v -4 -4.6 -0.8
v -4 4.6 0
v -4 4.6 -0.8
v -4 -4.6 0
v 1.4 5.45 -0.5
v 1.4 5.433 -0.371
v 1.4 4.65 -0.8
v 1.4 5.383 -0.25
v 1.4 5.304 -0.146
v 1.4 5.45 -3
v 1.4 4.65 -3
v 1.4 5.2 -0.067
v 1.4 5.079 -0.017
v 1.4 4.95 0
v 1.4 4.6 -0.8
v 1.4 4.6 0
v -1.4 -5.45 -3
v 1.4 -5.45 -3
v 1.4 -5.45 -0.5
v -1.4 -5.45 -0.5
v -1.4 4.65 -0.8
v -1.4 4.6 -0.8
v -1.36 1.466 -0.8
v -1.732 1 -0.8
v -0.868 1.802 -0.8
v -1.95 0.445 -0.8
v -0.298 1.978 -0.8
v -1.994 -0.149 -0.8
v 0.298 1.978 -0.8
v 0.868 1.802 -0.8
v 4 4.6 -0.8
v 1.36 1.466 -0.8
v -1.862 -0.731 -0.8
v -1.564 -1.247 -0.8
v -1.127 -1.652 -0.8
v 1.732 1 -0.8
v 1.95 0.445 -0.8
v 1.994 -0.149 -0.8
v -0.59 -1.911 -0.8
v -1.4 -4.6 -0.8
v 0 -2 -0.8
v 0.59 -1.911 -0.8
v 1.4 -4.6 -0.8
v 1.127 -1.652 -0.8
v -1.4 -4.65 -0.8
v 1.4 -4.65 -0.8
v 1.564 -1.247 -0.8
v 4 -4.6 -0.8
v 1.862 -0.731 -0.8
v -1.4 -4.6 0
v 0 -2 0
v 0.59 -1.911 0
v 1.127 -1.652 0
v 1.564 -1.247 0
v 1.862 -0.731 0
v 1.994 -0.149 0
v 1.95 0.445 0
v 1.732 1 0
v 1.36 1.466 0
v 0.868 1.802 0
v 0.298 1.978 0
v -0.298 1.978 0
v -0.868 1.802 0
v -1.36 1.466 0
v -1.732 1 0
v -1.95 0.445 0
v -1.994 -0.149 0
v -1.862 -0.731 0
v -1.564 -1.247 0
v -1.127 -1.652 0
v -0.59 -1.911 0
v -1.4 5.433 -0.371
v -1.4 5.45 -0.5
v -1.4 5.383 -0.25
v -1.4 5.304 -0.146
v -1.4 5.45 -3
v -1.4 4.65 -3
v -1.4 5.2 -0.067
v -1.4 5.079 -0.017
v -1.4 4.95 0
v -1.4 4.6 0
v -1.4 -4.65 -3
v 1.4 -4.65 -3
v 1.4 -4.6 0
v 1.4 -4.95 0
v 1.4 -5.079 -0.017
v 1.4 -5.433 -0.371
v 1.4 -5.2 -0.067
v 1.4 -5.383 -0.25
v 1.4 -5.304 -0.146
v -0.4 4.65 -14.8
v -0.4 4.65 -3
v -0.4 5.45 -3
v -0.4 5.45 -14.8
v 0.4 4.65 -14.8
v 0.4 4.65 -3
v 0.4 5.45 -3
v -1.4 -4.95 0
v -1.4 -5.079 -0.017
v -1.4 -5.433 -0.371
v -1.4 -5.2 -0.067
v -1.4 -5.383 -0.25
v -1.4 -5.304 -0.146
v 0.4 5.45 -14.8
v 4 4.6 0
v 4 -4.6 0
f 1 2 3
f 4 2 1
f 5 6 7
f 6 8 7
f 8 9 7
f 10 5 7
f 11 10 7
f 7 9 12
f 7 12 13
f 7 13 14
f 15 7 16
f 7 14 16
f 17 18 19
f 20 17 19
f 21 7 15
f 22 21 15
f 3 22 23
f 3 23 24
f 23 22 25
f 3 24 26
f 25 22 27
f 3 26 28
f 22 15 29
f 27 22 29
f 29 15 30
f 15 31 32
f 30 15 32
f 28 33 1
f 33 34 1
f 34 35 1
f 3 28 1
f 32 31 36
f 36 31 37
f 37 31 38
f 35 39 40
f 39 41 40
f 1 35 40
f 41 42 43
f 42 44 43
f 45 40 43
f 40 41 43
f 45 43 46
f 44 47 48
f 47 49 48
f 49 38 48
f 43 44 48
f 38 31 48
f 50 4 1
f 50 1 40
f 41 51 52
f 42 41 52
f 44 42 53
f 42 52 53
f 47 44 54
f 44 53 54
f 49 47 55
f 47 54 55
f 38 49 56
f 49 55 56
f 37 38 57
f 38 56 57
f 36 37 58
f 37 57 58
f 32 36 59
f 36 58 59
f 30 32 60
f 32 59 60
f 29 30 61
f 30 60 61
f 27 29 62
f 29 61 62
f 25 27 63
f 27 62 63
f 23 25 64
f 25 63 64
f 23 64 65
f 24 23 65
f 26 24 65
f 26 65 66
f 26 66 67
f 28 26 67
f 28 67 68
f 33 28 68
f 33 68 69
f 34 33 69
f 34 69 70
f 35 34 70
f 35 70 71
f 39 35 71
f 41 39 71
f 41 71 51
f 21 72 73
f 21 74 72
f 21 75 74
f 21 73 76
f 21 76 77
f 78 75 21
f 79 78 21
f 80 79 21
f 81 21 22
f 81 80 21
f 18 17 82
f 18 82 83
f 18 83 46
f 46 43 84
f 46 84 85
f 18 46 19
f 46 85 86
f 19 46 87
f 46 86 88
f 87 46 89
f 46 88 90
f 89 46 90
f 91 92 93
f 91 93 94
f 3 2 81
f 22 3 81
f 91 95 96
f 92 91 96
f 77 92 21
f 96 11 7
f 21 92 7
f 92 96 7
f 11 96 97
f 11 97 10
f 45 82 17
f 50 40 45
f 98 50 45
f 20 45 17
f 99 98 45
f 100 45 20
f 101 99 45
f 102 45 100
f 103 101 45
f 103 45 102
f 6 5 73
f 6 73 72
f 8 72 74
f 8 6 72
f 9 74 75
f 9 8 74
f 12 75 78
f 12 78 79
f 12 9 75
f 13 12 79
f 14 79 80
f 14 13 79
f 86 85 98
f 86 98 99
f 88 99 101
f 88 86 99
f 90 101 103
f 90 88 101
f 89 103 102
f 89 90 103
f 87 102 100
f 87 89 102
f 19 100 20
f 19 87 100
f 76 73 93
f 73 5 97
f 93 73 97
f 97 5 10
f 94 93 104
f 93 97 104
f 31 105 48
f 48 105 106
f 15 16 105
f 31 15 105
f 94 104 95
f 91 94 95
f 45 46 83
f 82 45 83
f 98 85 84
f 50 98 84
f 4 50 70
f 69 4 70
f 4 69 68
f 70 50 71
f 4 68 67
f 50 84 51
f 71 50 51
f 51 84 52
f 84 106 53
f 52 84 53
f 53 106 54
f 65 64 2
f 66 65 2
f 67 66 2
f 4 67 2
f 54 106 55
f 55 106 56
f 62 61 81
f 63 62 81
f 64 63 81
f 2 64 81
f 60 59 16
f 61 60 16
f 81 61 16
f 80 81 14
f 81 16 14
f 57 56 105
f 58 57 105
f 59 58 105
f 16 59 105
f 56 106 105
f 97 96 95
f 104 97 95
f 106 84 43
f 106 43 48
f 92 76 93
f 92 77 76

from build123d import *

# Parameters (mm, degrees)
PAD_DEPTH       = 4
SKETCH001_R     = 2
SKETCH001_W     = 0.85
SKETCH001_H     = 2.6
POCKET_DEPTH    = 10
SKETCH002_W     = 11.8
SKETCH002_H     = 3.6
POCKET001_DEPTH = 15
SKETCH003_W     = 11.8
SKETCH003_H     = 0.8
POCKET002_DEPTH = 5


with BuildPart() as part:
    # Sketch → Pad (new body, symmetric)
    with BuildSketch(Plane.YZ):
        with BuildLine():
            Line((-5.45, -14.8), (-5.45, -0.5))
            ThreePointArc((-4.95, 0), (-5.303553, -0.146447), (-5.45, -0.5))
            Line((-4.95, 0), (4.95, 0))
            ThreePointArc((5.45, -0.5), (5.303553, -0.146447), (4.95, 0))
            Line((5.45, -0.5), (5.45, -14.8))
            Line((5.45, -14.8), (4.65, -14.8))
            Line((4.65, -14.8), (4.65, -0.8))
            Line((4.65, -0.8), (-4.65, -0.8))
            Line((-4.65, -0.8), (-4.65, -14.8))
            Line((-4.65, -14.8), (-5.45, -14.8))
        make_face()
    extrude(amount=PAD_DEPTH, both=True)

    # Sketch001 (on Face9 of Pad) → Pocket (cut)
    with BuildSketch(Plane(origin=(0, 0, 0), x_dir=(0, -1, 0), z_dir=(0, 0, 1))):
        Circle(SKETCH001_R)
        with Locations((-5.025, 2.7)):
            Rectangle(SKETCH001_W, SKETCH001_H)
        with Locations((-5.025, -2.7)):
            Rectangle(SKETCH001_W, SKETCH001_H)
        with Locations((5.025, 2.7)):
            Rectangle(SKETCH001_W, SKETCH001_H)
        with Locations((5.025, -2.7)):
            Rectangle(SKETCH001_W, SKETCH001_H)
    extrude(amount=-POCKET_DEPTH, mode=Mode.SUBTRACT)

    # Sketch002 (on Face24 of Pocket) → Pocket001 (cut)
    with BuildSketch(Plane(origin=(0, -5.45, 0), x_dir=(0, 0, -1), z_dir=(0, -1, 0))):
        with Locations((8.9, 2.2)):
            Rectangle(SKETCH002_W, SKETCH002_H)
        with Locations((8.9, -2.2)):
            Rectangle(SKETCH002_W, SKETCH002_H)
    extrude(amount=-POCKET001_DEPTH, mode=Mode.SUBTRACT)

    # Sketch003 (on Face24 of Pocket001) → Pocket002 (cut)
    with BuildSketch(Plane(origin=(0, -5.45, 0), x_dir=(0, 0, -1), z_dir=(0, -1, 0))):
        with Locations((8.9, 0)):
            Rectangle(SKETCH003_W, SKETCH003_H)
    extrude(amount=-POCKET002_DEPTH, mode=Mode.SUBTRACT)


solid = part.part
